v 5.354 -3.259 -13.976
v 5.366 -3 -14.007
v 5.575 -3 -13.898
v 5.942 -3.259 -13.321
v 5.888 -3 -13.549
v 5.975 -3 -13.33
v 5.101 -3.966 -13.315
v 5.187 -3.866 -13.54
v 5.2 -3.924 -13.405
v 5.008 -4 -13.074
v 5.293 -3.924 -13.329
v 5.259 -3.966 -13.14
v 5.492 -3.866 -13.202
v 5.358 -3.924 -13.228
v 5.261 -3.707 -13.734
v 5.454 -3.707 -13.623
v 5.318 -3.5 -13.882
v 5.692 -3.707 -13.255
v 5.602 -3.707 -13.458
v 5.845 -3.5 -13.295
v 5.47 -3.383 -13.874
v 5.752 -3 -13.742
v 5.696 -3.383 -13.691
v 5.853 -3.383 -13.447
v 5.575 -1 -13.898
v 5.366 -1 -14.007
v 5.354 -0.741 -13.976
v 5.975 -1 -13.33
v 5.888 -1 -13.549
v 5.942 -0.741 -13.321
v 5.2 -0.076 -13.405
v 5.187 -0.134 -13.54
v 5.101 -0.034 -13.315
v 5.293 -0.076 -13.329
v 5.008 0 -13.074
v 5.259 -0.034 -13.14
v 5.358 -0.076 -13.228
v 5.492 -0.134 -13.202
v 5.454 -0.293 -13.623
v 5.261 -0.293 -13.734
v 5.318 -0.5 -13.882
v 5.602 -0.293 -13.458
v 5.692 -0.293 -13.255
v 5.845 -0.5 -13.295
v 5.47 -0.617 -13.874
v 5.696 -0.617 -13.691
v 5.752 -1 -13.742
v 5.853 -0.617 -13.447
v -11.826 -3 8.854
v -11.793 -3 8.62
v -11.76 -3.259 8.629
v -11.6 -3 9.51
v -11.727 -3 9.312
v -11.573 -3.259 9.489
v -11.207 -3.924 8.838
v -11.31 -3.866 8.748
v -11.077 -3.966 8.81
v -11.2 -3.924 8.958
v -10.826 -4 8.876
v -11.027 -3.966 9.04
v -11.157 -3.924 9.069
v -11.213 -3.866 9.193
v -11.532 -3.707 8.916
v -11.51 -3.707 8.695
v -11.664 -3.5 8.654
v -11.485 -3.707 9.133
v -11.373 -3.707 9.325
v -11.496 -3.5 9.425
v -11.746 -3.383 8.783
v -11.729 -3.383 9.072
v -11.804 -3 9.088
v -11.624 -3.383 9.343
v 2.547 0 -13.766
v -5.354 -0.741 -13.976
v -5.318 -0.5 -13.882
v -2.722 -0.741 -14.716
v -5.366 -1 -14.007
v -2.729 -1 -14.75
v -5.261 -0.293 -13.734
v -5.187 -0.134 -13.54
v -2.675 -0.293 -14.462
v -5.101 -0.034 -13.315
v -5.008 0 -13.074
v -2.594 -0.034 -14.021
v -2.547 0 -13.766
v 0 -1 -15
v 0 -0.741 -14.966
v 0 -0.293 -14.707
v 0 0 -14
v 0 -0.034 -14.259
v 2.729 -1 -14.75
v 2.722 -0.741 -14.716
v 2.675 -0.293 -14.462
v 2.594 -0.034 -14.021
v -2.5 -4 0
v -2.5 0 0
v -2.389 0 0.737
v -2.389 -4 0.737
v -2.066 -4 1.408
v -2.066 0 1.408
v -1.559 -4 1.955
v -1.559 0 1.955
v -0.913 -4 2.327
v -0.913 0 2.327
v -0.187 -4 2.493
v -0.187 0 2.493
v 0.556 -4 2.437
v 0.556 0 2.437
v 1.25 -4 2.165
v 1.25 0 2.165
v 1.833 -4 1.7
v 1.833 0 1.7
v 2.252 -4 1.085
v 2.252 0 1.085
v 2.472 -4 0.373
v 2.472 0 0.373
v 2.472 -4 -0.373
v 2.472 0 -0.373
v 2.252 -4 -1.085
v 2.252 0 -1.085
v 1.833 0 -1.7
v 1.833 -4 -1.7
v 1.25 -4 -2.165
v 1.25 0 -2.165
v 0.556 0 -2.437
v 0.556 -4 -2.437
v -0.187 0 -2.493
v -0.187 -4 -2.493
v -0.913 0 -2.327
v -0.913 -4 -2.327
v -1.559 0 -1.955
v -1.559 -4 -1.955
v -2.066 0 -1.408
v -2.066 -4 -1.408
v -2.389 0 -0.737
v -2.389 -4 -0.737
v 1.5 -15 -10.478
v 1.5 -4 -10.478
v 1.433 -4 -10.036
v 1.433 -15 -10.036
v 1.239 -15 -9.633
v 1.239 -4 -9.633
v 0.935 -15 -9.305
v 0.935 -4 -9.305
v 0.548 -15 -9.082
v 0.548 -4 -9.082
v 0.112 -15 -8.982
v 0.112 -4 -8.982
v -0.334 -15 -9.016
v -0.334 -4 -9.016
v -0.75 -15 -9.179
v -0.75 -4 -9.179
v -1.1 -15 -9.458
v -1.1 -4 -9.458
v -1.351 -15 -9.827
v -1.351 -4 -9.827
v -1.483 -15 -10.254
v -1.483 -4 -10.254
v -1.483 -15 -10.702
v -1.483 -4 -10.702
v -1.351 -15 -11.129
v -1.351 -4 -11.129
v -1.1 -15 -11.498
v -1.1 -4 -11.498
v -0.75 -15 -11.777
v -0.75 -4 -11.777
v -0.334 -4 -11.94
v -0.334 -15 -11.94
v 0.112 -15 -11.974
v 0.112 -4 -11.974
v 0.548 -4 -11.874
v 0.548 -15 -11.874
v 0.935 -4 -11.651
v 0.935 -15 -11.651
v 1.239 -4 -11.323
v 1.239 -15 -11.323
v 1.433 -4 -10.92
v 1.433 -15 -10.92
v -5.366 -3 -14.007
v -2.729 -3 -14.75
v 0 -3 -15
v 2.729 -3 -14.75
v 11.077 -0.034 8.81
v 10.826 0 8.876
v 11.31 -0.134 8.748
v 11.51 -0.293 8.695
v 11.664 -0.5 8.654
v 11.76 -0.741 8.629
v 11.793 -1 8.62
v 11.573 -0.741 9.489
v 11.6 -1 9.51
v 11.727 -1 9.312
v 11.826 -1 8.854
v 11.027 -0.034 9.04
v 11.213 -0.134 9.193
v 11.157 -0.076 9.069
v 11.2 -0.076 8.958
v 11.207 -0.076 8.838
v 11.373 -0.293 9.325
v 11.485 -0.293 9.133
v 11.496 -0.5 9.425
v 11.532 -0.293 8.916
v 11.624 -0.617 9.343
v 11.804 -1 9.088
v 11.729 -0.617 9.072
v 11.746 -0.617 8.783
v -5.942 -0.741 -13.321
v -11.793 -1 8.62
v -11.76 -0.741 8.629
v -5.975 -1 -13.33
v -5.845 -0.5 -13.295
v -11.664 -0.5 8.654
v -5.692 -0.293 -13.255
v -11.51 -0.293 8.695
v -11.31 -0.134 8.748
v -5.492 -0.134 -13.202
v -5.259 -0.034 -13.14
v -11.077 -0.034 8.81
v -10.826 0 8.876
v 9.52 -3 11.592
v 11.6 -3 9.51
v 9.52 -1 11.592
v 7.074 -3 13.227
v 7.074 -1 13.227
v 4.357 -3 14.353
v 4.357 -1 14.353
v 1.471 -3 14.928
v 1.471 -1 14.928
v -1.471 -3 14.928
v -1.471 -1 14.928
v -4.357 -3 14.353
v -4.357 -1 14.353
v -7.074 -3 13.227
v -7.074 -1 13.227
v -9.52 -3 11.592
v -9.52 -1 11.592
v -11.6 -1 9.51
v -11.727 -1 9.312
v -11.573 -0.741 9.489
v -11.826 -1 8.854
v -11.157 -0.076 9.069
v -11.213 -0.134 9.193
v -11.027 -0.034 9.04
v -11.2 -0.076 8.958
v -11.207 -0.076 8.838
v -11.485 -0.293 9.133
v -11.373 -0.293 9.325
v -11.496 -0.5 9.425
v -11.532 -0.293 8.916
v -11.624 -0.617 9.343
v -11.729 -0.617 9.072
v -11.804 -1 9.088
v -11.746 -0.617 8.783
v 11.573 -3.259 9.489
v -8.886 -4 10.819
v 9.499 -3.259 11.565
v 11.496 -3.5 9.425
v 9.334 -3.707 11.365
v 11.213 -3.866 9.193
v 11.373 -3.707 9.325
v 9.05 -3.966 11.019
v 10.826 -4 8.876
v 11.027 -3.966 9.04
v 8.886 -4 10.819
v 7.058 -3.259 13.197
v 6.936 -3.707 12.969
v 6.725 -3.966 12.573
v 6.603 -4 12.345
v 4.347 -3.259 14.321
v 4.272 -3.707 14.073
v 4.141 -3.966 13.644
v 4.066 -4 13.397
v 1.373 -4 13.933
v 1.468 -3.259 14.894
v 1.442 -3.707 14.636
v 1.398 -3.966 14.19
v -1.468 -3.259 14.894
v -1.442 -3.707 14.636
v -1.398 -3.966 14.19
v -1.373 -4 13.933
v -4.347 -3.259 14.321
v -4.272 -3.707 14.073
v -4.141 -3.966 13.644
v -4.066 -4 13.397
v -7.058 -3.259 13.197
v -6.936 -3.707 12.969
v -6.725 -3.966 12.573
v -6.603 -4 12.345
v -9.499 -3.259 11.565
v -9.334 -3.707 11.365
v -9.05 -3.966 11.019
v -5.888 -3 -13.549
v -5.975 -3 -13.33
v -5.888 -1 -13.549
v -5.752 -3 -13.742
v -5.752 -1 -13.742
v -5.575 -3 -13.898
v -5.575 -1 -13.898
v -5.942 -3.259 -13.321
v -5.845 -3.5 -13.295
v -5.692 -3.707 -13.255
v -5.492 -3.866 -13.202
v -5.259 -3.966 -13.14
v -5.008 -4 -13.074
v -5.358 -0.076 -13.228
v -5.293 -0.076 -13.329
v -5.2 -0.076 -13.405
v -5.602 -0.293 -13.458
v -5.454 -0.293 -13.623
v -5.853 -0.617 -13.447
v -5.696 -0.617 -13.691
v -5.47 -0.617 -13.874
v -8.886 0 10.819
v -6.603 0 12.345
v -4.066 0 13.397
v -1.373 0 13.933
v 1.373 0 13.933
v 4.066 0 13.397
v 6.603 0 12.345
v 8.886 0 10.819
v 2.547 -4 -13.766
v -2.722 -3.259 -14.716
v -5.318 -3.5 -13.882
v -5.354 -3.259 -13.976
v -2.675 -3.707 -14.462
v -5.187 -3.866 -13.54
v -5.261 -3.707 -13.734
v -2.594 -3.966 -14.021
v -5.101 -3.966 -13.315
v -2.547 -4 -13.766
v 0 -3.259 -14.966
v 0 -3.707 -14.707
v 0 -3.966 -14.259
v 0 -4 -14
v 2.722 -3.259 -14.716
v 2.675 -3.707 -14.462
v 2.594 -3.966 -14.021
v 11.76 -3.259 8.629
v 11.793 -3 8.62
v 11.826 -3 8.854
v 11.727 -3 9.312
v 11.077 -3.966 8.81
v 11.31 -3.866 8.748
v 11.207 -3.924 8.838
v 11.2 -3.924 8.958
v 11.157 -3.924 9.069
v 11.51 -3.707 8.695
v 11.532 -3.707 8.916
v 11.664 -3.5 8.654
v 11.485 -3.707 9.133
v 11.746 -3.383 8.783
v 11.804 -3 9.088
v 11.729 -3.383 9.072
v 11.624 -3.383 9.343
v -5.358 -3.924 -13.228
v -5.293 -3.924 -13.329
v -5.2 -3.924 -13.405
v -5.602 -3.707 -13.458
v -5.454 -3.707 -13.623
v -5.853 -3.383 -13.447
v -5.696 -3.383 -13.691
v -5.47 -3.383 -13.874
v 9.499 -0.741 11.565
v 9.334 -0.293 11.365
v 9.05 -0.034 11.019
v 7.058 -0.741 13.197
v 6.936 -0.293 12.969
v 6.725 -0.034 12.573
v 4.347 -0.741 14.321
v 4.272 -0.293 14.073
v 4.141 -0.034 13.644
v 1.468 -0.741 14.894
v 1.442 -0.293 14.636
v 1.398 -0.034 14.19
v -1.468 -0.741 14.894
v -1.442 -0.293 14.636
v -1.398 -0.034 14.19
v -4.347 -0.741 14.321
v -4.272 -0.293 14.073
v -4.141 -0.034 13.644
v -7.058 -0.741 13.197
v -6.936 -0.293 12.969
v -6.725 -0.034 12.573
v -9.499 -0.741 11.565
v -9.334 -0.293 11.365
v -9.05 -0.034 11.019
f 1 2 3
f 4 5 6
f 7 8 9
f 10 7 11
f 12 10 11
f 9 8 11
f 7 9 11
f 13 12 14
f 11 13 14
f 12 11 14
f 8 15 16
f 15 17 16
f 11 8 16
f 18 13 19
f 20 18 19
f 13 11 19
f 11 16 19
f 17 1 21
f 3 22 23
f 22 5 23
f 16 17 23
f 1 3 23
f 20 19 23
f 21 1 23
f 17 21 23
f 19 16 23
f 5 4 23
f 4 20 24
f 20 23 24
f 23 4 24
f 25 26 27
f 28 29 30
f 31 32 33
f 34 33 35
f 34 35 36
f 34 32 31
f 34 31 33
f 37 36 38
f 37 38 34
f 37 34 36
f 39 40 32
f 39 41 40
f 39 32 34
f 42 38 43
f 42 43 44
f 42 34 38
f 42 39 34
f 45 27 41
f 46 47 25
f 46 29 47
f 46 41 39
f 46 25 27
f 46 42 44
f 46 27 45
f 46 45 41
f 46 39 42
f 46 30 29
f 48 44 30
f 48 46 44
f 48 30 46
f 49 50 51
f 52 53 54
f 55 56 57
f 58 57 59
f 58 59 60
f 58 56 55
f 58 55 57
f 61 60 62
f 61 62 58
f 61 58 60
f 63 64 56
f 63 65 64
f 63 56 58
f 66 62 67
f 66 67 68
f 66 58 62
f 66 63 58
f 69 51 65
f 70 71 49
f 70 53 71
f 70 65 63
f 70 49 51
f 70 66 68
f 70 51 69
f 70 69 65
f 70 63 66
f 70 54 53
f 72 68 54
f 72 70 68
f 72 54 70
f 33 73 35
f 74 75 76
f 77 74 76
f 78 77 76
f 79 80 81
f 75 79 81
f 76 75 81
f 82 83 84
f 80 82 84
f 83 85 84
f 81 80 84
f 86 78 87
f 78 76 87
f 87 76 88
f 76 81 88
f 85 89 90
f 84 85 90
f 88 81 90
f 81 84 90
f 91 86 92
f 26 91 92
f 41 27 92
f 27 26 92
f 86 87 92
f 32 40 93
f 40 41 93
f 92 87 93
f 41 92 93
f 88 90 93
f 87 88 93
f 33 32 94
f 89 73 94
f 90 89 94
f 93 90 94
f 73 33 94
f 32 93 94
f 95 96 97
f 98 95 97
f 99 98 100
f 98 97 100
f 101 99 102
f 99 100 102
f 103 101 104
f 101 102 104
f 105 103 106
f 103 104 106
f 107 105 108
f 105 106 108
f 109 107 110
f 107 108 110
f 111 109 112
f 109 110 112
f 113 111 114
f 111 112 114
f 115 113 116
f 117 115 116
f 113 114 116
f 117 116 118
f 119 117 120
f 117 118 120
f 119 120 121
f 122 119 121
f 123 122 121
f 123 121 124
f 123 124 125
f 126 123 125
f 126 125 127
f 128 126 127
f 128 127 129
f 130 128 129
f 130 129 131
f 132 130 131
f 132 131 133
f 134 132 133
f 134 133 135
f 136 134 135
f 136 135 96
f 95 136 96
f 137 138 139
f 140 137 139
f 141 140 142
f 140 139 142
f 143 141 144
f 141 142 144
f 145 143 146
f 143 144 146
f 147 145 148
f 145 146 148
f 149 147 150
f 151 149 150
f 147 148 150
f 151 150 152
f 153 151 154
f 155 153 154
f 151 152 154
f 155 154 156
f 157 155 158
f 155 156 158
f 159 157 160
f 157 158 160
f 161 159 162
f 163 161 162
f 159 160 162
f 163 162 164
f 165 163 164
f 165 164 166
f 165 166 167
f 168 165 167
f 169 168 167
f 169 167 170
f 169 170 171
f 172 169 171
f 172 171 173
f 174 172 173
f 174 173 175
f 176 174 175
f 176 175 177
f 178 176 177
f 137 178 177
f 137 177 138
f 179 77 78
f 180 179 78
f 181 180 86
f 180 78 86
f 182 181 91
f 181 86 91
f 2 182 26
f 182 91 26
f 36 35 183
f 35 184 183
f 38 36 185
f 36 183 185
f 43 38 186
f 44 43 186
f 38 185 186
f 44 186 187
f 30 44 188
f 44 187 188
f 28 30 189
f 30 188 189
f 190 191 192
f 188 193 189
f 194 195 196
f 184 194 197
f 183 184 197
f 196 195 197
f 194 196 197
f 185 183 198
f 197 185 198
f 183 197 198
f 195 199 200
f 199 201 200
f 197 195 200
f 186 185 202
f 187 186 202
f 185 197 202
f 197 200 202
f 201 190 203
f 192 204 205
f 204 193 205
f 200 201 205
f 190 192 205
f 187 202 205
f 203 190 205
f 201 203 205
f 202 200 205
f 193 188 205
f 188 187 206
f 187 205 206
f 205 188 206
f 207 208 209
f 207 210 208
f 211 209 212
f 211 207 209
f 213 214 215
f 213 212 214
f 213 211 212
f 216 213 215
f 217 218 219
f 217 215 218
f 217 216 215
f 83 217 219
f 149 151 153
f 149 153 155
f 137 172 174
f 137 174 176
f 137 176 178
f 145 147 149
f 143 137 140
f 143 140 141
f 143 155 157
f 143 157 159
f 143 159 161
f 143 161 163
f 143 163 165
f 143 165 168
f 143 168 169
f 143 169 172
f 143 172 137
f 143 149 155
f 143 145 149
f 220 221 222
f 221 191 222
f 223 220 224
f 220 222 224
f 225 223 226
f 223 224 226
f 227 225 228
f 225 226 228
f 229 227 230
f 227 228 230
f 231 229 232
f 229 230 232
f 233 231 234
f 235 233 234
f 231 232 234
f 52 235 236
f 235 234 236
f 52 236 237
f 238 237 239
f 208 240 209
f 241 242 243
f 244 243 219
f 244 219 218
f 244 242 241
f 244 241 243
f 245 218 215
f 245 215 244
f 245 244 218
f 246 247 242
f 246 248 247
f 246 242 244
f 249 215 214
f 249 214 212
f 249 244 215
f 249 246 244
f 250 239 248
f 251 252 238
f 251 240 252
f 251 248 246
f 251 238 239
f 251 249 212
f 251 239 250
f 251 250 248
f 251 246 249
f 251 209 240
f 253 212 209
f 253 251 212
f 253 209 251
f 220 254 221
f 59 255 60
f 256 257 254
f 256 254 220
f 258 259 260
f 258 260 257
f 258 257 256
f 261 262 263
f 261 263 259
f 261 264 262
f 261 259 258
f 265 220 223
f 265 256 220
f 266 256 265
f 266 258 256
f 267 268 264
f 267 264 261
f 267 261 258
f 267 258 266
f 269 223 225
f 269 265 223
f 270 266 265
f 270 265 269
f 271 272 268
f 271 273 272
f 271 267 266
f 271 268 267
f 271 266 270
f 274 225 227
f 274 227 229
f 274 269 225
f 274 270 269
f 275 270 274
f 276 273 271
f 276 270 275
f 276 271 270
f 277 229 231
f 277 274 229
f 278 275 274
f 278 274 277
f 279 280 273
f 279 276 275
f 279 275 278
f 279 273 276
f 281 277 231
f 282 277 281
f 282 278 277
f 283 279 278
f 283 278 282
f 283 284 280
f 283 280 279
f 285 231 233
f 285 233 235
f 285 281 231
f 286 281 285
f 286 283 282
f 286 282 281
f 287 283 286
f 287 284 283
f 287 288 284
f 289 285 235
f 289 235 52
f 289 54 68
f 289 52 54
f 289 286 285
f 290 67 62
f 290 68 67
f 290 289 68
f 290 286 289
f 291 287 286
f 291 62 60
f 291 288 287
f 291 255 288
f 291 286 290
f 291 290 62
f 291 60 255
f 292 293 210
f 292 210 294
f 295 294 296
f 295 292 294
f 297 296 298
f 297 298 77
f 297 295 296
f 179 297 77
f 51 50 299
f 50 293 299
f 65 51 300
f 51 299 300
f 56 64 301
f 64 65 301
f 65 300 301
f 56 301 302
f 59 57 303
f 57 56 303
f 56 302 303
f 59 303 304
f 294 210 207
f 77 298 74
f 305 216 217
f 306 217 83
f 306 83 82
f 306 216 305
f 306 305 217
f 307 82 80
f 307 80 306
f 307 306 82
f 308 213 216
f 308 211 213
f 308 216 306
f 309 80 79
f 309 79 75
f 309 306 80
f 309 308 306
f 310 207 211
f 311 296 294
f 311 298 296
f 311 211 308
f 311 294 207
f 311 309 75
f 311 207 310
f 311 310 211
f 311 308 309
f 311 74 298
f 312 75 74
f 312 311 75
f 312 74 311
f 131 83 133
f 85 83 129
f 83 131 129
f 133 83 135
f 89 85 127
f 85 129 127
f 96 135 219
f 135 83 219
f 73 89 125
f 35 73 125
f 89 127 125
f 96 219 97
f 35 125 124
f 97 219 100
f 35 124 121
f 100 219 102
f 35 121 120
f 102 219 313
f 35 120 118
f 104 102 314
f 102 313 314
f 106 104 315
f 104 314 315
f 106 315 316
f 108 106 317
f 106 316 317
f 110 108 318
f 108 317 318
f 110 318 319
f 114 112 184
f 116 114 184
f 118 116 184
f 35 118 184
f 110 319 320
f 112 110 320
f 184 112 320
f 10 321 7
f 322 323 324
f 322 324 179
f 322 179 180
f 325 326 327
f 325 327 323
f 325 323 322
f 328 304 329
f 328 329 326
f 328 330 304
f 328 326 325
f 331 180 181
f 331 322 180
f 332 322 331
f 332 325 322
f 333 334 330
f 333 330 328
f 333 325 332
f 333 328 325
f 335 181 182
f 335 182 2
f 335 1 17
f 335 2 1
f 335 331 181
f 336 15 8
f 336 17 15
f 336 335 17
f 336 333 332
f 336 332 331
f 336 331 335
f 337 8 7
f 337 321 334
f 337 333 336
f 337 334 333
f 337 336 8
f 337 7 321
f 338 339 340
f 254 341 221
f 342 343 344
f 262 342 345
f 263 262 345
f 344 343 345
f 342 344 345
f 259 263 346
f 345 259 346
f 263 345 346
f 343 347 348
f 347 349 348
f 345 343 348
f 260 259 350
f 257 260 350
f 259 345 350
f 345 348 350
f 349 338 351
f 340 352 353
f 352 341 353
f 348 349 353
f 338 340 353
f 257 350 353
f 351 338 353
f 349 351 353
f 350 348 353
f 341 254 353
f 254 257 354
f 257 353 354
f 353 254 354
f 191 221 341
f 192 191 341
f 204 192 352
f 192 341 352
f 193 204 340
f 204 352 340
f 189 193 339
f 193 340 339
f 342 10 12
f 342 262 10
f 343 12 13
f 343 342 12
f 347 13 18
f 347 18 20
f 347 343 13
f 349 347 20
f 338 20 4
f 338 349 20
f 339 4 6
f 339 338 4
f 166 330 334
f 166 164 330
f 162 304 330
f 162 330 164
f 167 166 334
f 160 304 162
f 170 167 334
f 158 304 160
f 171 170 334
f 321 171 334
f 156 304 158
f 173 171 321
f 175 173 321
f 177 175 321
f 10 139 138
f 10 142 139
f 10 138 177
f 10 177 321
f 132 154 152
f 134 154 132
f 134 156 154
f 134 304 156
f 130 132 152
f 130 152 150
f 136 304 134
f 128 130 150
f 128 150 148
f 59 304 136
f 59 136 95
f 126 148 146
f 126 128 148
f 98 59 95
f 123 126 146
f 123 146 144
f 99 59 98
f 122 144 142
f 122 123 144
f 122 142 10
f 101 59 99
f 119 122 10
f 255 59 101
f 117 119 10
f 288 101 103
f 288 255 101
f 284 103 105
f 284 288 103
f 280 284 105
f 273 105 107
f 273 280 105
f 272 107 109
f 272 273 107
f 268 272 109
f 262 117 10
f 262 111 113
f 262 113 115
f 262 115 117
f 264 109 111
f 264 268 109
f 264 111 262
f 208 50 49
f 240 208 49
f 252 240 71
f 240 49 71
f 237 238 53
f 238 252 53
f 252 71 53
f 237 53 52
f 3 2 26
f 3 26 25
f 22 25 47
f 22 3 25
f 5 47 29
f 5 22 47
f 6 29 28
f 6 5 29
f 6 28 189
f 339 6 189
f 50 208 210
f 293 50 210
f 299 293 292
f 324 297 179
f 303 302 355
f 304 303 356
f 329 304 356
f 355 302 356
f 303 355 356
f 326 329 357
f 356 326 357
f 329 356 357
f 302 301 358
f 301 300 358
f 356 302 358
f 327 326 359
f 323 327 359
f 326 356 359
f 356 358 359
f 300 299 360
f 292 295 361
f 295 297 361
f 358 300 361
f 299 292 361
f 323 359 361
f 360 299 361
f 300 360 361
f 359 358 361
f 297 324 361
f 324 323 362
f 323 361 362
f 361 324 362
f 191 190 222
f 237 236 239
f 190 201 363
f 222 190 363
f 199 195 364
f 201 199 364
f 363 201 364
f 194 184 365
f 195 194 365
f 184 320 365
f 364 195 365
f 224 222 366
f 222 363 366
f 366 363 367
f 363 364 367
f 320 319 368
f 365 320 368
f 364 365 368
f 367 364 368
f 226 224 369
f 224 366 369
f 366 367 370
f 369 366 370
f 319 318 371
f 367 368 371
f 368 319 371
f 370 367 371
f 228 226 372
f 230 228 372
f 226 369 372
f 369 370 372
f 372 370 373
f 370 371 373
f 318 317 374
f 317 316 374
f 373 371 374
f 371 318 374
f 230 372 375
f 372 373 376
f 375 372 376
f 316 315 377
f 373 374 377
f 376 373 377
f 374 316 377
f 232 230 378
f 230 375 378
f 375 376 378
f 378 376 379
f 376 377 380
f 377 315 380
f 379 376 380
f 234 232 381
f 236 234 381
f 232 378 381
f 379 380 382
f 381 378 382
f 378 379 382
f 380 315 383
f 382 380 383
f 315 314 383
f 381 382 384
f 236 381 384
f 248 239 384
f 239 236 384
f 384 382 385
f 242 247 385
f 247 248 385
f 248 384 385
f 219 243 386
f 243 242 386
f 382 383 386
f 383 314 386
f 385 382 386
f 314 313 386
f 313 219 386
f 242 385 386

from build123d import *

# Parameters (mm, degrees)
F0_R     = 1.5
F1_DEPTH = 15
F2_DEPTH = 4
F3_R     = 2.5
F4_DEPTH = 25
F5_R     = 1


with BuildPart() as f1:
    # F0 (on Front) → F1 (new body)
    with BuildSketch(Plane.XZ):
        with Locations((0, -10.47795)):
            Circle(F0_R)
    extrude(amount=F1_DEPTH)

    # F0 (on Front) → F2 (join)
    with BuildSketch(Plane.XZ):
        with BuildLine():
            Line((-11.9213, 9.103989), (-5.846707, -13.813617))
            ThreePointArc((-5.846707, -13.813617), (0, -15), (5.846707, -13.813617))
            Line((5.846707, -13.813617), (11.9213, 9.103989))
            ThreePointArc((11.9213, 9.103989), (0, 15), (-11.9213, 9.103989))
        make_face()
        with Locations((0, -10.47795)):
            Circle(F0_R, mode=Mode.SUBTRACT)
    extrude(amount=F2_DEPTH)

    # F3 (on face) → F4 (cut)
    with BuildSketch(Plane(origin=(0, 0, 0), x_dir=(-1, 0, 0), z_dir=(0, 1, 0))):
        Circle(F3_R)
    extrude(amount=-F4_DEPTH, mode=Mode.SUBTRACT)

    # F5
    f5_edges = [f1.edges().sort_by_distance(p)[0] for p in [
        (0, -4, 15),
        (11.9213, -2, 9.103989),
        (-11.9213, -2, 9.103989),
        (0, 0, 15),
        (5.846707, -2, -13.813617),
        (0, -4, -15),
        (0, 0, -15),
        (-5.846707, -2, -13.813617),
        (-8.884003, 0, -2.354814),
        (-8.884003, -4, -2.354814),
        (8.884003, -4, -2.354814),
        (8.884003, 0, -2.354814),
    ]]
    fillet(f5_edges, radius=F5_R)


solid = f1.part
